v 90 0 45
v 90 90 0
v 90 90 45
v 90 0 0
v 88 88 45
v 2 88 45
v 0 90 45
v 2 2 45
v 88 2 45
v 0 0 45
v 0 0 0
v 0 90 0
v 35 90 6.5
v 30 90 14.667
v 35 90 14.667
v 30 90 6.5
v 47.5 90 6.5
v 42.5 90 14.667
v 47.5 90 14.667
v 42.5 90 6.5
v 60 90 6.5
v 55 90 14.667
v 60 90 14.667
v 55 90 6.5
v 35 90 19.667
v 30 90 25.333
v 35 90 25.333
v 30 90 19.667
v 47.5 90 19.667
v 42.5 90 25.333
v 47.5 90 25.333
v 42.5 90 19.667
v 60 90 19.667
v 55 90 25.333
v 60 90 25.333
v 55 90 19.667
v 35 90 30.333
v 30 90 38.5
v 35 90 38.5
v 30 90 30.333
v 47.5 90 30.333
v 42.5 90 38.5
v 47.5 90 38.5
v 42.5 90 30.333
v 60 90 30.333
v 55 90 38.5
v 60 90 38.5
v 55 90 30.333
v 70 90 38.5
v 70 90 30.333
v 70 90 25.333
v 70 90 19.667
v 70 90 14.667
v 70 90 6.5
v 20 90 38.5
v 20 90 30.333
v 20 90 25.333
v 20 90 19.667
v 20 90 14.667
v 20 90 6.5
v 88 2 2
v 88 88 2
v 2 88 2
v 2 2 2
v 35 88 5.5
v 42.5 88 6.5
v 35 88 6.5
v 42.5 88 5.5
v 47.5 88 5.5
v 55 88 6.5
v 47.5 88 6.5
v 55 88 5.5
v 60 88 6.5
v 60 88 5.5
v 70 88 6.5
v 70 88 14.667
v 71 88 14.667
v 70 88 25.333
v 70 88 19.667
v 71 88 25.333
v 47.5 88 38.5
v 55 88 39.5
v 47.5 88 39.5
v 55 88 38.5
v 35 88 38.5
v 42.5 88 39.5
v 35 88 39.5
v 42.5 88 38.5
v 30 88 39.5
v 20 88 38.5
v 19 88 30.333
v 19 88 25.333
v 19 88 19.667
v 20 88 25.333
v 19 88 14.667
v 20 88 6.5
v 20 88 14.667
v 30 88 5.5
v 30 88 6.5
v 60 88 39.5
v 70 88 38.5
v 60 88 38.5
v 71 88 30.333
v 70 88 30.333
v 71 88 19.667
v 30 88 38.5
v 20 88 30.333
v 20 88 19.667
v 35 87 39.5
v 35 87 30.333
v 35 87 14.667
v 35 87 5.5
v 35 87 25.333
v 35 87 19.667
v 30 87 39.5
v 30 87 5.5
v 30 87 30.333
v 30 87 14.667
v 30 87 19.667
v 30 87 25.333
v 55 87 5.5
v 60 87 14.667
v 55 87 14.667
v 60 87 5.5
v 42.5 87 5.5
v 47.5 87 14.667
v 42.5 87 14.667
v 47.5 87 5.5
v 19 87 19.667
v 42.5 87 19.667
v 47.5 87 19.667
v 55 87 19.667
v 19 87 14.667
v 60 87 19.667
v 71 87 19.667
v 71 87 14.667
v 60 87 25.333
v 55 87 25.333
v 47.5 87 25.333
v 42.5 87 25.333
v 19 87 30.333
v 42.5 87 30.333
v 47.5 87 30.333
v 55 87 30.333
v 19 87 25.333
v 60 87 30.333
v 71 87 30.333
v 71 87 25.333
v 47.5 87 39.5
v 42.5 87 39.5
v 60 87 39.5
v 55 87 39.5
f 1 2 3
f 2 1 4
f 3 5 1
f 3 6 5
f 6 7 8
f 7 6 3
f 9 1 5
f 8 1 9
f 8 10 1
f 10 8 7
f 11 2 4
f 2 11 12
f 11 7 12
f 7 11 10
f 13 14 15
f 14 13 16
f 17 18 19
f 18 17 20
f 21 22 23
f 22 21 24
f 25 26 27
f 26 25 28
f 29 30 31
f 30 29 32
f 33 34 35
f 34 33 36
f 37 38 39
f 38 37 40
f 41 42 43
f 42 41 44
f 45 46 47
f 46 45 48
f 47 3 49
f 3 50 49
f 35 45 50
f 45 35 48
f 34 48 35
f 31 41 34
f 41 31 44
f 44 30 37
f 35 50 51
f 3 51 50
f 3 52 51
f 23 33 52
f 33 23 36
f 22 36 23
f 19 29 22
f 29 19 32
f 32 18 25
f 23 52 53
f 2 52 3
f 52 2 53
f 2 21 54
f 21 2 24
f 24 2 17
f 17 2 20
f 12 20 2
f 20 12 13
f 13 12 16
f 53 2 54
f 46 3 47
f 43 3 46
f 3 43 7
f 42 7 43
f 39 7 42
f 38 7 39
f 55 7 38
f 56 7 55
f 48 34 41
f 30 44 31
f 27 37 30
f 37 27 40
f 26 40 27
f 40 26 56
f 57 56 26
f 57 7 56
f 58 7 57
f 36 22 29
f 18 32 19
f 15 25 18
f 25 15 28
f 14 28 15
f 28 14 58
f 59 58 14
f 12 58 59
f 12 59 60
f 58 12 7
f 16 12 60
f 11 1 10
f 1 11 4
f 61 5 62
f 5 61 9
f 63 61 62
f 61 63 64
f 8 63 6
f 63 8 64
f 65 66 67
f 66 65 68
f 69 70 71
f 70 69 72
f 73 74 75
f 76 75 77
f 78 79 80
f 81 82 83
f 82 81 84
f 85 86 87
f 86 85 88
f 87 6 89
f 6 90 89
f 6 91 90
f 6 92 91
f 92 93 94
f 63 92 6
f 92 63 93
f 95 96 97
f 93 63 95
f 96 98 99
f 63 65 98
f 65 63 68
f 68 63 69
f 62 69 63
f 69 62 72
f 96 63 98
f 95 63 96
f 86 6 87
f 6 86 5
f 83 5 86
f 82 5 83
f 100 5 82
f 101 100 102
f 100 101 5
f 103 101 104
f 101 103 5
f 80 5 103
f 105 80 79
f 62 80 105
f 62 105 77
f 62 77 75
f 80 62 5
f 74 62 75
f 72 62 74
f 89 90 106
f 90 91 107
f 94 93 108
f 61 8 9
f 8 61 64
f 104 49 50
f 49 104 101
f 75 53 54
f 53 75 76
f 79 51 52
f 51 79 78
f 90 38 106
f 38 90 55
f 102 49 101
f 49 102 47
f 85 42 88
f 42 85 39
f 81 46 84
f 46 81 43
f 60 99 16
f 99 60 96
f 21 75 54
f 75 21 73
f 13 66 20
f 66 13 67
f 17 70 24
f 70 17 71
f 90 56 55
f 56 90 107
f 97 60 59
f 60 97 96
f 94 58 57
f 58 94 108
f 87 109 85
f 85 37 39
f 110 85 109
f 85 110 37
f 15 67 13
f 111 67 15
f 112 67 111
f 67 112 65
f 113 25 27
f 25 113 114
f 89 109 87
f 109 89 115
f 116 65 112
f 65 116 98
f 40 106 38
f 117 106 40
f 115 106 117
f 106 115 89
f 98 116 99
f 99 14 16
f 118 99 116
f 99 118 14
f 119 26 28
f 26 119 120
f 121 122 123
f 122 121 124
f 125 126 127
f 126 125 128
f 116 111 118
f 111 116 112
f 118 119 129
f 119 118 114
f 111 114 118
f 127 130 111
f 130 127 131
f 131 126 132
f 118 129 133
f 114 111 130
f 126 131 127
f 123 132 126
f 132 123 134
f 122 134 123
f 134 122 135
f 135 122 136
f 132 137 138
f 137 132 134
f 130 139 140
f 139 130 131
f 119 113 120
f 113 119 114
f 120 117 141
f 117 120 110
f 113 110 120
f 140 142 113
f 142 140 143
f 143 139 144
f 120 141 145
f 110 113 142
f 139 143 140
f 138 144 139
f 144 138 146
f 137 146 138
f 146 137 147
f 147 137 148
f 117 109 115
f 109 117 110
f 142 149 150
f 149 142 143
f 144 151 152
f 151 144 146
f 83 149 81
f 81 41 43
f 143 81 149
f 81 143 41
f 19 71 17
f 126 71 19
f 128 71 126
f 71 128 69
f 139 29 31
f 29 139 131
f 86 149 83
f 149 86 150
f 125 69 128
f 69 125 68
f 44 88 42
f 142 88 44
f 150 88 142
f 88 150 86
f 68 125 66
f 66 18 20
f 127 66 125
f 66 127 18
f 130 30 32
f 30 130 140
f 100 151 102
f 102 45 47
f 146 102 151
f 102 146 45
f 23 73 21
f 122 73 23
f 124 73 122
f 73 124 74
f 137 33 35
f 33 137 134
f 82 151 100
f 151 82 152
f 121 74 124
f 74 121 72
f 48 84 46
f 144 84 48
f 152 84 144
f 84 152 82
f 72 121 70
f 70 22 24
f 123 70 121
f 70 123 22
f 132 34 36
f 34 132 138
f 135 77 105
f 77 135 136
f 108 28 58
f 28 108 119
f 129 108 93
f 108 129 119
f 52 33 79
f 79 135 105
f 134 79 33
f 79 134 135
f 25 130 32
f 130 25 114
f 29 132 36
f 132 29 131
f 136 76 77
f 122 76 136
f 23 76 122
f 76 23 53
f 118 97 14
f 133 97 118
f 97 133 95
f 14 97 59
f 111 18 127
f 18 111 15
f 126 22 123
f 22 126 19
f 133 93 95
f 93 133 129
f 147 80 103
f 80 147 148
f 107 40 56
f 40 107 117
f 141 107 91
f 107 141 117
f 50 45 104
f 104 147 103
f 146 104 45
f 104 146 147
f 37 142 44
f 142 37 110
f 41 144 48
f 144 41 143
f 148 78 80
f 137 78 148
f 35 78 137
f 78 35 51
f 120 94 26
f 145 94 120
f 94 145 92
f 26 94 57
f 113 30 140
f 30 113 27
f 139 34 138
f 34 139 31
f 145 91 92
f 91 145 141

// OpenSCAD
$fn = 32;

// ----------------------------------------------------------------------
// Vent box: crossgrid enclosure
// ----------------------------------------------------------------------

// --- parameters (mm) ---
box_l = 90;               // box length, X
box_w = 90;               // box width, Y
box_h = 45;               // box height, Z
wall_t = 2;               // shell wall thickness
win_l = 50;               // vent window width, X
win_h = 32;               // vent window height, Z
bar_w = 5;                // grid bar width
n_v = 3;                  // vertical bar count
n_h = 2;                  // horizontal bar count

win_z0 = (box_h - win_h) / 2;  // window lower edge Z
v_step = win_l / (n_v + 1);  // vertical bar step
h_step = win_h / (n_h + 1);  // horizontal bar step

difference() {
  union() {
    difference() {
      cube([box_l, box_w, box_h]);
  translate([wall_t, wall_t, wall_t])
    cube([box_l - 2 * wall_t, box_w - 2 * wall_t, box_h]);
  translate([(box_l - win_l) / 2, box_w - wall_t - 1, win_z0])
    cube([win_l, wall_t + 2, win_h]);
    }
    for (i = [1 : n_v])
      translate([(box_l - win_l) / 2 + i * v_step - bar_w / 2,
                 box_w - wall_t - 1, win_z0 - 1])
        cube([bar_w, wall_t + 1, win_h + 2]);
    for (i = [1 : n_h])
      translate([(box_l - win_l) / 2 - 1, box_w - wall_t - 1,
                 win_z0 + i * h_step - bar_w / 2])
        cube([win_l + 2, wall_t + 1, bar_w]);
  }
}
